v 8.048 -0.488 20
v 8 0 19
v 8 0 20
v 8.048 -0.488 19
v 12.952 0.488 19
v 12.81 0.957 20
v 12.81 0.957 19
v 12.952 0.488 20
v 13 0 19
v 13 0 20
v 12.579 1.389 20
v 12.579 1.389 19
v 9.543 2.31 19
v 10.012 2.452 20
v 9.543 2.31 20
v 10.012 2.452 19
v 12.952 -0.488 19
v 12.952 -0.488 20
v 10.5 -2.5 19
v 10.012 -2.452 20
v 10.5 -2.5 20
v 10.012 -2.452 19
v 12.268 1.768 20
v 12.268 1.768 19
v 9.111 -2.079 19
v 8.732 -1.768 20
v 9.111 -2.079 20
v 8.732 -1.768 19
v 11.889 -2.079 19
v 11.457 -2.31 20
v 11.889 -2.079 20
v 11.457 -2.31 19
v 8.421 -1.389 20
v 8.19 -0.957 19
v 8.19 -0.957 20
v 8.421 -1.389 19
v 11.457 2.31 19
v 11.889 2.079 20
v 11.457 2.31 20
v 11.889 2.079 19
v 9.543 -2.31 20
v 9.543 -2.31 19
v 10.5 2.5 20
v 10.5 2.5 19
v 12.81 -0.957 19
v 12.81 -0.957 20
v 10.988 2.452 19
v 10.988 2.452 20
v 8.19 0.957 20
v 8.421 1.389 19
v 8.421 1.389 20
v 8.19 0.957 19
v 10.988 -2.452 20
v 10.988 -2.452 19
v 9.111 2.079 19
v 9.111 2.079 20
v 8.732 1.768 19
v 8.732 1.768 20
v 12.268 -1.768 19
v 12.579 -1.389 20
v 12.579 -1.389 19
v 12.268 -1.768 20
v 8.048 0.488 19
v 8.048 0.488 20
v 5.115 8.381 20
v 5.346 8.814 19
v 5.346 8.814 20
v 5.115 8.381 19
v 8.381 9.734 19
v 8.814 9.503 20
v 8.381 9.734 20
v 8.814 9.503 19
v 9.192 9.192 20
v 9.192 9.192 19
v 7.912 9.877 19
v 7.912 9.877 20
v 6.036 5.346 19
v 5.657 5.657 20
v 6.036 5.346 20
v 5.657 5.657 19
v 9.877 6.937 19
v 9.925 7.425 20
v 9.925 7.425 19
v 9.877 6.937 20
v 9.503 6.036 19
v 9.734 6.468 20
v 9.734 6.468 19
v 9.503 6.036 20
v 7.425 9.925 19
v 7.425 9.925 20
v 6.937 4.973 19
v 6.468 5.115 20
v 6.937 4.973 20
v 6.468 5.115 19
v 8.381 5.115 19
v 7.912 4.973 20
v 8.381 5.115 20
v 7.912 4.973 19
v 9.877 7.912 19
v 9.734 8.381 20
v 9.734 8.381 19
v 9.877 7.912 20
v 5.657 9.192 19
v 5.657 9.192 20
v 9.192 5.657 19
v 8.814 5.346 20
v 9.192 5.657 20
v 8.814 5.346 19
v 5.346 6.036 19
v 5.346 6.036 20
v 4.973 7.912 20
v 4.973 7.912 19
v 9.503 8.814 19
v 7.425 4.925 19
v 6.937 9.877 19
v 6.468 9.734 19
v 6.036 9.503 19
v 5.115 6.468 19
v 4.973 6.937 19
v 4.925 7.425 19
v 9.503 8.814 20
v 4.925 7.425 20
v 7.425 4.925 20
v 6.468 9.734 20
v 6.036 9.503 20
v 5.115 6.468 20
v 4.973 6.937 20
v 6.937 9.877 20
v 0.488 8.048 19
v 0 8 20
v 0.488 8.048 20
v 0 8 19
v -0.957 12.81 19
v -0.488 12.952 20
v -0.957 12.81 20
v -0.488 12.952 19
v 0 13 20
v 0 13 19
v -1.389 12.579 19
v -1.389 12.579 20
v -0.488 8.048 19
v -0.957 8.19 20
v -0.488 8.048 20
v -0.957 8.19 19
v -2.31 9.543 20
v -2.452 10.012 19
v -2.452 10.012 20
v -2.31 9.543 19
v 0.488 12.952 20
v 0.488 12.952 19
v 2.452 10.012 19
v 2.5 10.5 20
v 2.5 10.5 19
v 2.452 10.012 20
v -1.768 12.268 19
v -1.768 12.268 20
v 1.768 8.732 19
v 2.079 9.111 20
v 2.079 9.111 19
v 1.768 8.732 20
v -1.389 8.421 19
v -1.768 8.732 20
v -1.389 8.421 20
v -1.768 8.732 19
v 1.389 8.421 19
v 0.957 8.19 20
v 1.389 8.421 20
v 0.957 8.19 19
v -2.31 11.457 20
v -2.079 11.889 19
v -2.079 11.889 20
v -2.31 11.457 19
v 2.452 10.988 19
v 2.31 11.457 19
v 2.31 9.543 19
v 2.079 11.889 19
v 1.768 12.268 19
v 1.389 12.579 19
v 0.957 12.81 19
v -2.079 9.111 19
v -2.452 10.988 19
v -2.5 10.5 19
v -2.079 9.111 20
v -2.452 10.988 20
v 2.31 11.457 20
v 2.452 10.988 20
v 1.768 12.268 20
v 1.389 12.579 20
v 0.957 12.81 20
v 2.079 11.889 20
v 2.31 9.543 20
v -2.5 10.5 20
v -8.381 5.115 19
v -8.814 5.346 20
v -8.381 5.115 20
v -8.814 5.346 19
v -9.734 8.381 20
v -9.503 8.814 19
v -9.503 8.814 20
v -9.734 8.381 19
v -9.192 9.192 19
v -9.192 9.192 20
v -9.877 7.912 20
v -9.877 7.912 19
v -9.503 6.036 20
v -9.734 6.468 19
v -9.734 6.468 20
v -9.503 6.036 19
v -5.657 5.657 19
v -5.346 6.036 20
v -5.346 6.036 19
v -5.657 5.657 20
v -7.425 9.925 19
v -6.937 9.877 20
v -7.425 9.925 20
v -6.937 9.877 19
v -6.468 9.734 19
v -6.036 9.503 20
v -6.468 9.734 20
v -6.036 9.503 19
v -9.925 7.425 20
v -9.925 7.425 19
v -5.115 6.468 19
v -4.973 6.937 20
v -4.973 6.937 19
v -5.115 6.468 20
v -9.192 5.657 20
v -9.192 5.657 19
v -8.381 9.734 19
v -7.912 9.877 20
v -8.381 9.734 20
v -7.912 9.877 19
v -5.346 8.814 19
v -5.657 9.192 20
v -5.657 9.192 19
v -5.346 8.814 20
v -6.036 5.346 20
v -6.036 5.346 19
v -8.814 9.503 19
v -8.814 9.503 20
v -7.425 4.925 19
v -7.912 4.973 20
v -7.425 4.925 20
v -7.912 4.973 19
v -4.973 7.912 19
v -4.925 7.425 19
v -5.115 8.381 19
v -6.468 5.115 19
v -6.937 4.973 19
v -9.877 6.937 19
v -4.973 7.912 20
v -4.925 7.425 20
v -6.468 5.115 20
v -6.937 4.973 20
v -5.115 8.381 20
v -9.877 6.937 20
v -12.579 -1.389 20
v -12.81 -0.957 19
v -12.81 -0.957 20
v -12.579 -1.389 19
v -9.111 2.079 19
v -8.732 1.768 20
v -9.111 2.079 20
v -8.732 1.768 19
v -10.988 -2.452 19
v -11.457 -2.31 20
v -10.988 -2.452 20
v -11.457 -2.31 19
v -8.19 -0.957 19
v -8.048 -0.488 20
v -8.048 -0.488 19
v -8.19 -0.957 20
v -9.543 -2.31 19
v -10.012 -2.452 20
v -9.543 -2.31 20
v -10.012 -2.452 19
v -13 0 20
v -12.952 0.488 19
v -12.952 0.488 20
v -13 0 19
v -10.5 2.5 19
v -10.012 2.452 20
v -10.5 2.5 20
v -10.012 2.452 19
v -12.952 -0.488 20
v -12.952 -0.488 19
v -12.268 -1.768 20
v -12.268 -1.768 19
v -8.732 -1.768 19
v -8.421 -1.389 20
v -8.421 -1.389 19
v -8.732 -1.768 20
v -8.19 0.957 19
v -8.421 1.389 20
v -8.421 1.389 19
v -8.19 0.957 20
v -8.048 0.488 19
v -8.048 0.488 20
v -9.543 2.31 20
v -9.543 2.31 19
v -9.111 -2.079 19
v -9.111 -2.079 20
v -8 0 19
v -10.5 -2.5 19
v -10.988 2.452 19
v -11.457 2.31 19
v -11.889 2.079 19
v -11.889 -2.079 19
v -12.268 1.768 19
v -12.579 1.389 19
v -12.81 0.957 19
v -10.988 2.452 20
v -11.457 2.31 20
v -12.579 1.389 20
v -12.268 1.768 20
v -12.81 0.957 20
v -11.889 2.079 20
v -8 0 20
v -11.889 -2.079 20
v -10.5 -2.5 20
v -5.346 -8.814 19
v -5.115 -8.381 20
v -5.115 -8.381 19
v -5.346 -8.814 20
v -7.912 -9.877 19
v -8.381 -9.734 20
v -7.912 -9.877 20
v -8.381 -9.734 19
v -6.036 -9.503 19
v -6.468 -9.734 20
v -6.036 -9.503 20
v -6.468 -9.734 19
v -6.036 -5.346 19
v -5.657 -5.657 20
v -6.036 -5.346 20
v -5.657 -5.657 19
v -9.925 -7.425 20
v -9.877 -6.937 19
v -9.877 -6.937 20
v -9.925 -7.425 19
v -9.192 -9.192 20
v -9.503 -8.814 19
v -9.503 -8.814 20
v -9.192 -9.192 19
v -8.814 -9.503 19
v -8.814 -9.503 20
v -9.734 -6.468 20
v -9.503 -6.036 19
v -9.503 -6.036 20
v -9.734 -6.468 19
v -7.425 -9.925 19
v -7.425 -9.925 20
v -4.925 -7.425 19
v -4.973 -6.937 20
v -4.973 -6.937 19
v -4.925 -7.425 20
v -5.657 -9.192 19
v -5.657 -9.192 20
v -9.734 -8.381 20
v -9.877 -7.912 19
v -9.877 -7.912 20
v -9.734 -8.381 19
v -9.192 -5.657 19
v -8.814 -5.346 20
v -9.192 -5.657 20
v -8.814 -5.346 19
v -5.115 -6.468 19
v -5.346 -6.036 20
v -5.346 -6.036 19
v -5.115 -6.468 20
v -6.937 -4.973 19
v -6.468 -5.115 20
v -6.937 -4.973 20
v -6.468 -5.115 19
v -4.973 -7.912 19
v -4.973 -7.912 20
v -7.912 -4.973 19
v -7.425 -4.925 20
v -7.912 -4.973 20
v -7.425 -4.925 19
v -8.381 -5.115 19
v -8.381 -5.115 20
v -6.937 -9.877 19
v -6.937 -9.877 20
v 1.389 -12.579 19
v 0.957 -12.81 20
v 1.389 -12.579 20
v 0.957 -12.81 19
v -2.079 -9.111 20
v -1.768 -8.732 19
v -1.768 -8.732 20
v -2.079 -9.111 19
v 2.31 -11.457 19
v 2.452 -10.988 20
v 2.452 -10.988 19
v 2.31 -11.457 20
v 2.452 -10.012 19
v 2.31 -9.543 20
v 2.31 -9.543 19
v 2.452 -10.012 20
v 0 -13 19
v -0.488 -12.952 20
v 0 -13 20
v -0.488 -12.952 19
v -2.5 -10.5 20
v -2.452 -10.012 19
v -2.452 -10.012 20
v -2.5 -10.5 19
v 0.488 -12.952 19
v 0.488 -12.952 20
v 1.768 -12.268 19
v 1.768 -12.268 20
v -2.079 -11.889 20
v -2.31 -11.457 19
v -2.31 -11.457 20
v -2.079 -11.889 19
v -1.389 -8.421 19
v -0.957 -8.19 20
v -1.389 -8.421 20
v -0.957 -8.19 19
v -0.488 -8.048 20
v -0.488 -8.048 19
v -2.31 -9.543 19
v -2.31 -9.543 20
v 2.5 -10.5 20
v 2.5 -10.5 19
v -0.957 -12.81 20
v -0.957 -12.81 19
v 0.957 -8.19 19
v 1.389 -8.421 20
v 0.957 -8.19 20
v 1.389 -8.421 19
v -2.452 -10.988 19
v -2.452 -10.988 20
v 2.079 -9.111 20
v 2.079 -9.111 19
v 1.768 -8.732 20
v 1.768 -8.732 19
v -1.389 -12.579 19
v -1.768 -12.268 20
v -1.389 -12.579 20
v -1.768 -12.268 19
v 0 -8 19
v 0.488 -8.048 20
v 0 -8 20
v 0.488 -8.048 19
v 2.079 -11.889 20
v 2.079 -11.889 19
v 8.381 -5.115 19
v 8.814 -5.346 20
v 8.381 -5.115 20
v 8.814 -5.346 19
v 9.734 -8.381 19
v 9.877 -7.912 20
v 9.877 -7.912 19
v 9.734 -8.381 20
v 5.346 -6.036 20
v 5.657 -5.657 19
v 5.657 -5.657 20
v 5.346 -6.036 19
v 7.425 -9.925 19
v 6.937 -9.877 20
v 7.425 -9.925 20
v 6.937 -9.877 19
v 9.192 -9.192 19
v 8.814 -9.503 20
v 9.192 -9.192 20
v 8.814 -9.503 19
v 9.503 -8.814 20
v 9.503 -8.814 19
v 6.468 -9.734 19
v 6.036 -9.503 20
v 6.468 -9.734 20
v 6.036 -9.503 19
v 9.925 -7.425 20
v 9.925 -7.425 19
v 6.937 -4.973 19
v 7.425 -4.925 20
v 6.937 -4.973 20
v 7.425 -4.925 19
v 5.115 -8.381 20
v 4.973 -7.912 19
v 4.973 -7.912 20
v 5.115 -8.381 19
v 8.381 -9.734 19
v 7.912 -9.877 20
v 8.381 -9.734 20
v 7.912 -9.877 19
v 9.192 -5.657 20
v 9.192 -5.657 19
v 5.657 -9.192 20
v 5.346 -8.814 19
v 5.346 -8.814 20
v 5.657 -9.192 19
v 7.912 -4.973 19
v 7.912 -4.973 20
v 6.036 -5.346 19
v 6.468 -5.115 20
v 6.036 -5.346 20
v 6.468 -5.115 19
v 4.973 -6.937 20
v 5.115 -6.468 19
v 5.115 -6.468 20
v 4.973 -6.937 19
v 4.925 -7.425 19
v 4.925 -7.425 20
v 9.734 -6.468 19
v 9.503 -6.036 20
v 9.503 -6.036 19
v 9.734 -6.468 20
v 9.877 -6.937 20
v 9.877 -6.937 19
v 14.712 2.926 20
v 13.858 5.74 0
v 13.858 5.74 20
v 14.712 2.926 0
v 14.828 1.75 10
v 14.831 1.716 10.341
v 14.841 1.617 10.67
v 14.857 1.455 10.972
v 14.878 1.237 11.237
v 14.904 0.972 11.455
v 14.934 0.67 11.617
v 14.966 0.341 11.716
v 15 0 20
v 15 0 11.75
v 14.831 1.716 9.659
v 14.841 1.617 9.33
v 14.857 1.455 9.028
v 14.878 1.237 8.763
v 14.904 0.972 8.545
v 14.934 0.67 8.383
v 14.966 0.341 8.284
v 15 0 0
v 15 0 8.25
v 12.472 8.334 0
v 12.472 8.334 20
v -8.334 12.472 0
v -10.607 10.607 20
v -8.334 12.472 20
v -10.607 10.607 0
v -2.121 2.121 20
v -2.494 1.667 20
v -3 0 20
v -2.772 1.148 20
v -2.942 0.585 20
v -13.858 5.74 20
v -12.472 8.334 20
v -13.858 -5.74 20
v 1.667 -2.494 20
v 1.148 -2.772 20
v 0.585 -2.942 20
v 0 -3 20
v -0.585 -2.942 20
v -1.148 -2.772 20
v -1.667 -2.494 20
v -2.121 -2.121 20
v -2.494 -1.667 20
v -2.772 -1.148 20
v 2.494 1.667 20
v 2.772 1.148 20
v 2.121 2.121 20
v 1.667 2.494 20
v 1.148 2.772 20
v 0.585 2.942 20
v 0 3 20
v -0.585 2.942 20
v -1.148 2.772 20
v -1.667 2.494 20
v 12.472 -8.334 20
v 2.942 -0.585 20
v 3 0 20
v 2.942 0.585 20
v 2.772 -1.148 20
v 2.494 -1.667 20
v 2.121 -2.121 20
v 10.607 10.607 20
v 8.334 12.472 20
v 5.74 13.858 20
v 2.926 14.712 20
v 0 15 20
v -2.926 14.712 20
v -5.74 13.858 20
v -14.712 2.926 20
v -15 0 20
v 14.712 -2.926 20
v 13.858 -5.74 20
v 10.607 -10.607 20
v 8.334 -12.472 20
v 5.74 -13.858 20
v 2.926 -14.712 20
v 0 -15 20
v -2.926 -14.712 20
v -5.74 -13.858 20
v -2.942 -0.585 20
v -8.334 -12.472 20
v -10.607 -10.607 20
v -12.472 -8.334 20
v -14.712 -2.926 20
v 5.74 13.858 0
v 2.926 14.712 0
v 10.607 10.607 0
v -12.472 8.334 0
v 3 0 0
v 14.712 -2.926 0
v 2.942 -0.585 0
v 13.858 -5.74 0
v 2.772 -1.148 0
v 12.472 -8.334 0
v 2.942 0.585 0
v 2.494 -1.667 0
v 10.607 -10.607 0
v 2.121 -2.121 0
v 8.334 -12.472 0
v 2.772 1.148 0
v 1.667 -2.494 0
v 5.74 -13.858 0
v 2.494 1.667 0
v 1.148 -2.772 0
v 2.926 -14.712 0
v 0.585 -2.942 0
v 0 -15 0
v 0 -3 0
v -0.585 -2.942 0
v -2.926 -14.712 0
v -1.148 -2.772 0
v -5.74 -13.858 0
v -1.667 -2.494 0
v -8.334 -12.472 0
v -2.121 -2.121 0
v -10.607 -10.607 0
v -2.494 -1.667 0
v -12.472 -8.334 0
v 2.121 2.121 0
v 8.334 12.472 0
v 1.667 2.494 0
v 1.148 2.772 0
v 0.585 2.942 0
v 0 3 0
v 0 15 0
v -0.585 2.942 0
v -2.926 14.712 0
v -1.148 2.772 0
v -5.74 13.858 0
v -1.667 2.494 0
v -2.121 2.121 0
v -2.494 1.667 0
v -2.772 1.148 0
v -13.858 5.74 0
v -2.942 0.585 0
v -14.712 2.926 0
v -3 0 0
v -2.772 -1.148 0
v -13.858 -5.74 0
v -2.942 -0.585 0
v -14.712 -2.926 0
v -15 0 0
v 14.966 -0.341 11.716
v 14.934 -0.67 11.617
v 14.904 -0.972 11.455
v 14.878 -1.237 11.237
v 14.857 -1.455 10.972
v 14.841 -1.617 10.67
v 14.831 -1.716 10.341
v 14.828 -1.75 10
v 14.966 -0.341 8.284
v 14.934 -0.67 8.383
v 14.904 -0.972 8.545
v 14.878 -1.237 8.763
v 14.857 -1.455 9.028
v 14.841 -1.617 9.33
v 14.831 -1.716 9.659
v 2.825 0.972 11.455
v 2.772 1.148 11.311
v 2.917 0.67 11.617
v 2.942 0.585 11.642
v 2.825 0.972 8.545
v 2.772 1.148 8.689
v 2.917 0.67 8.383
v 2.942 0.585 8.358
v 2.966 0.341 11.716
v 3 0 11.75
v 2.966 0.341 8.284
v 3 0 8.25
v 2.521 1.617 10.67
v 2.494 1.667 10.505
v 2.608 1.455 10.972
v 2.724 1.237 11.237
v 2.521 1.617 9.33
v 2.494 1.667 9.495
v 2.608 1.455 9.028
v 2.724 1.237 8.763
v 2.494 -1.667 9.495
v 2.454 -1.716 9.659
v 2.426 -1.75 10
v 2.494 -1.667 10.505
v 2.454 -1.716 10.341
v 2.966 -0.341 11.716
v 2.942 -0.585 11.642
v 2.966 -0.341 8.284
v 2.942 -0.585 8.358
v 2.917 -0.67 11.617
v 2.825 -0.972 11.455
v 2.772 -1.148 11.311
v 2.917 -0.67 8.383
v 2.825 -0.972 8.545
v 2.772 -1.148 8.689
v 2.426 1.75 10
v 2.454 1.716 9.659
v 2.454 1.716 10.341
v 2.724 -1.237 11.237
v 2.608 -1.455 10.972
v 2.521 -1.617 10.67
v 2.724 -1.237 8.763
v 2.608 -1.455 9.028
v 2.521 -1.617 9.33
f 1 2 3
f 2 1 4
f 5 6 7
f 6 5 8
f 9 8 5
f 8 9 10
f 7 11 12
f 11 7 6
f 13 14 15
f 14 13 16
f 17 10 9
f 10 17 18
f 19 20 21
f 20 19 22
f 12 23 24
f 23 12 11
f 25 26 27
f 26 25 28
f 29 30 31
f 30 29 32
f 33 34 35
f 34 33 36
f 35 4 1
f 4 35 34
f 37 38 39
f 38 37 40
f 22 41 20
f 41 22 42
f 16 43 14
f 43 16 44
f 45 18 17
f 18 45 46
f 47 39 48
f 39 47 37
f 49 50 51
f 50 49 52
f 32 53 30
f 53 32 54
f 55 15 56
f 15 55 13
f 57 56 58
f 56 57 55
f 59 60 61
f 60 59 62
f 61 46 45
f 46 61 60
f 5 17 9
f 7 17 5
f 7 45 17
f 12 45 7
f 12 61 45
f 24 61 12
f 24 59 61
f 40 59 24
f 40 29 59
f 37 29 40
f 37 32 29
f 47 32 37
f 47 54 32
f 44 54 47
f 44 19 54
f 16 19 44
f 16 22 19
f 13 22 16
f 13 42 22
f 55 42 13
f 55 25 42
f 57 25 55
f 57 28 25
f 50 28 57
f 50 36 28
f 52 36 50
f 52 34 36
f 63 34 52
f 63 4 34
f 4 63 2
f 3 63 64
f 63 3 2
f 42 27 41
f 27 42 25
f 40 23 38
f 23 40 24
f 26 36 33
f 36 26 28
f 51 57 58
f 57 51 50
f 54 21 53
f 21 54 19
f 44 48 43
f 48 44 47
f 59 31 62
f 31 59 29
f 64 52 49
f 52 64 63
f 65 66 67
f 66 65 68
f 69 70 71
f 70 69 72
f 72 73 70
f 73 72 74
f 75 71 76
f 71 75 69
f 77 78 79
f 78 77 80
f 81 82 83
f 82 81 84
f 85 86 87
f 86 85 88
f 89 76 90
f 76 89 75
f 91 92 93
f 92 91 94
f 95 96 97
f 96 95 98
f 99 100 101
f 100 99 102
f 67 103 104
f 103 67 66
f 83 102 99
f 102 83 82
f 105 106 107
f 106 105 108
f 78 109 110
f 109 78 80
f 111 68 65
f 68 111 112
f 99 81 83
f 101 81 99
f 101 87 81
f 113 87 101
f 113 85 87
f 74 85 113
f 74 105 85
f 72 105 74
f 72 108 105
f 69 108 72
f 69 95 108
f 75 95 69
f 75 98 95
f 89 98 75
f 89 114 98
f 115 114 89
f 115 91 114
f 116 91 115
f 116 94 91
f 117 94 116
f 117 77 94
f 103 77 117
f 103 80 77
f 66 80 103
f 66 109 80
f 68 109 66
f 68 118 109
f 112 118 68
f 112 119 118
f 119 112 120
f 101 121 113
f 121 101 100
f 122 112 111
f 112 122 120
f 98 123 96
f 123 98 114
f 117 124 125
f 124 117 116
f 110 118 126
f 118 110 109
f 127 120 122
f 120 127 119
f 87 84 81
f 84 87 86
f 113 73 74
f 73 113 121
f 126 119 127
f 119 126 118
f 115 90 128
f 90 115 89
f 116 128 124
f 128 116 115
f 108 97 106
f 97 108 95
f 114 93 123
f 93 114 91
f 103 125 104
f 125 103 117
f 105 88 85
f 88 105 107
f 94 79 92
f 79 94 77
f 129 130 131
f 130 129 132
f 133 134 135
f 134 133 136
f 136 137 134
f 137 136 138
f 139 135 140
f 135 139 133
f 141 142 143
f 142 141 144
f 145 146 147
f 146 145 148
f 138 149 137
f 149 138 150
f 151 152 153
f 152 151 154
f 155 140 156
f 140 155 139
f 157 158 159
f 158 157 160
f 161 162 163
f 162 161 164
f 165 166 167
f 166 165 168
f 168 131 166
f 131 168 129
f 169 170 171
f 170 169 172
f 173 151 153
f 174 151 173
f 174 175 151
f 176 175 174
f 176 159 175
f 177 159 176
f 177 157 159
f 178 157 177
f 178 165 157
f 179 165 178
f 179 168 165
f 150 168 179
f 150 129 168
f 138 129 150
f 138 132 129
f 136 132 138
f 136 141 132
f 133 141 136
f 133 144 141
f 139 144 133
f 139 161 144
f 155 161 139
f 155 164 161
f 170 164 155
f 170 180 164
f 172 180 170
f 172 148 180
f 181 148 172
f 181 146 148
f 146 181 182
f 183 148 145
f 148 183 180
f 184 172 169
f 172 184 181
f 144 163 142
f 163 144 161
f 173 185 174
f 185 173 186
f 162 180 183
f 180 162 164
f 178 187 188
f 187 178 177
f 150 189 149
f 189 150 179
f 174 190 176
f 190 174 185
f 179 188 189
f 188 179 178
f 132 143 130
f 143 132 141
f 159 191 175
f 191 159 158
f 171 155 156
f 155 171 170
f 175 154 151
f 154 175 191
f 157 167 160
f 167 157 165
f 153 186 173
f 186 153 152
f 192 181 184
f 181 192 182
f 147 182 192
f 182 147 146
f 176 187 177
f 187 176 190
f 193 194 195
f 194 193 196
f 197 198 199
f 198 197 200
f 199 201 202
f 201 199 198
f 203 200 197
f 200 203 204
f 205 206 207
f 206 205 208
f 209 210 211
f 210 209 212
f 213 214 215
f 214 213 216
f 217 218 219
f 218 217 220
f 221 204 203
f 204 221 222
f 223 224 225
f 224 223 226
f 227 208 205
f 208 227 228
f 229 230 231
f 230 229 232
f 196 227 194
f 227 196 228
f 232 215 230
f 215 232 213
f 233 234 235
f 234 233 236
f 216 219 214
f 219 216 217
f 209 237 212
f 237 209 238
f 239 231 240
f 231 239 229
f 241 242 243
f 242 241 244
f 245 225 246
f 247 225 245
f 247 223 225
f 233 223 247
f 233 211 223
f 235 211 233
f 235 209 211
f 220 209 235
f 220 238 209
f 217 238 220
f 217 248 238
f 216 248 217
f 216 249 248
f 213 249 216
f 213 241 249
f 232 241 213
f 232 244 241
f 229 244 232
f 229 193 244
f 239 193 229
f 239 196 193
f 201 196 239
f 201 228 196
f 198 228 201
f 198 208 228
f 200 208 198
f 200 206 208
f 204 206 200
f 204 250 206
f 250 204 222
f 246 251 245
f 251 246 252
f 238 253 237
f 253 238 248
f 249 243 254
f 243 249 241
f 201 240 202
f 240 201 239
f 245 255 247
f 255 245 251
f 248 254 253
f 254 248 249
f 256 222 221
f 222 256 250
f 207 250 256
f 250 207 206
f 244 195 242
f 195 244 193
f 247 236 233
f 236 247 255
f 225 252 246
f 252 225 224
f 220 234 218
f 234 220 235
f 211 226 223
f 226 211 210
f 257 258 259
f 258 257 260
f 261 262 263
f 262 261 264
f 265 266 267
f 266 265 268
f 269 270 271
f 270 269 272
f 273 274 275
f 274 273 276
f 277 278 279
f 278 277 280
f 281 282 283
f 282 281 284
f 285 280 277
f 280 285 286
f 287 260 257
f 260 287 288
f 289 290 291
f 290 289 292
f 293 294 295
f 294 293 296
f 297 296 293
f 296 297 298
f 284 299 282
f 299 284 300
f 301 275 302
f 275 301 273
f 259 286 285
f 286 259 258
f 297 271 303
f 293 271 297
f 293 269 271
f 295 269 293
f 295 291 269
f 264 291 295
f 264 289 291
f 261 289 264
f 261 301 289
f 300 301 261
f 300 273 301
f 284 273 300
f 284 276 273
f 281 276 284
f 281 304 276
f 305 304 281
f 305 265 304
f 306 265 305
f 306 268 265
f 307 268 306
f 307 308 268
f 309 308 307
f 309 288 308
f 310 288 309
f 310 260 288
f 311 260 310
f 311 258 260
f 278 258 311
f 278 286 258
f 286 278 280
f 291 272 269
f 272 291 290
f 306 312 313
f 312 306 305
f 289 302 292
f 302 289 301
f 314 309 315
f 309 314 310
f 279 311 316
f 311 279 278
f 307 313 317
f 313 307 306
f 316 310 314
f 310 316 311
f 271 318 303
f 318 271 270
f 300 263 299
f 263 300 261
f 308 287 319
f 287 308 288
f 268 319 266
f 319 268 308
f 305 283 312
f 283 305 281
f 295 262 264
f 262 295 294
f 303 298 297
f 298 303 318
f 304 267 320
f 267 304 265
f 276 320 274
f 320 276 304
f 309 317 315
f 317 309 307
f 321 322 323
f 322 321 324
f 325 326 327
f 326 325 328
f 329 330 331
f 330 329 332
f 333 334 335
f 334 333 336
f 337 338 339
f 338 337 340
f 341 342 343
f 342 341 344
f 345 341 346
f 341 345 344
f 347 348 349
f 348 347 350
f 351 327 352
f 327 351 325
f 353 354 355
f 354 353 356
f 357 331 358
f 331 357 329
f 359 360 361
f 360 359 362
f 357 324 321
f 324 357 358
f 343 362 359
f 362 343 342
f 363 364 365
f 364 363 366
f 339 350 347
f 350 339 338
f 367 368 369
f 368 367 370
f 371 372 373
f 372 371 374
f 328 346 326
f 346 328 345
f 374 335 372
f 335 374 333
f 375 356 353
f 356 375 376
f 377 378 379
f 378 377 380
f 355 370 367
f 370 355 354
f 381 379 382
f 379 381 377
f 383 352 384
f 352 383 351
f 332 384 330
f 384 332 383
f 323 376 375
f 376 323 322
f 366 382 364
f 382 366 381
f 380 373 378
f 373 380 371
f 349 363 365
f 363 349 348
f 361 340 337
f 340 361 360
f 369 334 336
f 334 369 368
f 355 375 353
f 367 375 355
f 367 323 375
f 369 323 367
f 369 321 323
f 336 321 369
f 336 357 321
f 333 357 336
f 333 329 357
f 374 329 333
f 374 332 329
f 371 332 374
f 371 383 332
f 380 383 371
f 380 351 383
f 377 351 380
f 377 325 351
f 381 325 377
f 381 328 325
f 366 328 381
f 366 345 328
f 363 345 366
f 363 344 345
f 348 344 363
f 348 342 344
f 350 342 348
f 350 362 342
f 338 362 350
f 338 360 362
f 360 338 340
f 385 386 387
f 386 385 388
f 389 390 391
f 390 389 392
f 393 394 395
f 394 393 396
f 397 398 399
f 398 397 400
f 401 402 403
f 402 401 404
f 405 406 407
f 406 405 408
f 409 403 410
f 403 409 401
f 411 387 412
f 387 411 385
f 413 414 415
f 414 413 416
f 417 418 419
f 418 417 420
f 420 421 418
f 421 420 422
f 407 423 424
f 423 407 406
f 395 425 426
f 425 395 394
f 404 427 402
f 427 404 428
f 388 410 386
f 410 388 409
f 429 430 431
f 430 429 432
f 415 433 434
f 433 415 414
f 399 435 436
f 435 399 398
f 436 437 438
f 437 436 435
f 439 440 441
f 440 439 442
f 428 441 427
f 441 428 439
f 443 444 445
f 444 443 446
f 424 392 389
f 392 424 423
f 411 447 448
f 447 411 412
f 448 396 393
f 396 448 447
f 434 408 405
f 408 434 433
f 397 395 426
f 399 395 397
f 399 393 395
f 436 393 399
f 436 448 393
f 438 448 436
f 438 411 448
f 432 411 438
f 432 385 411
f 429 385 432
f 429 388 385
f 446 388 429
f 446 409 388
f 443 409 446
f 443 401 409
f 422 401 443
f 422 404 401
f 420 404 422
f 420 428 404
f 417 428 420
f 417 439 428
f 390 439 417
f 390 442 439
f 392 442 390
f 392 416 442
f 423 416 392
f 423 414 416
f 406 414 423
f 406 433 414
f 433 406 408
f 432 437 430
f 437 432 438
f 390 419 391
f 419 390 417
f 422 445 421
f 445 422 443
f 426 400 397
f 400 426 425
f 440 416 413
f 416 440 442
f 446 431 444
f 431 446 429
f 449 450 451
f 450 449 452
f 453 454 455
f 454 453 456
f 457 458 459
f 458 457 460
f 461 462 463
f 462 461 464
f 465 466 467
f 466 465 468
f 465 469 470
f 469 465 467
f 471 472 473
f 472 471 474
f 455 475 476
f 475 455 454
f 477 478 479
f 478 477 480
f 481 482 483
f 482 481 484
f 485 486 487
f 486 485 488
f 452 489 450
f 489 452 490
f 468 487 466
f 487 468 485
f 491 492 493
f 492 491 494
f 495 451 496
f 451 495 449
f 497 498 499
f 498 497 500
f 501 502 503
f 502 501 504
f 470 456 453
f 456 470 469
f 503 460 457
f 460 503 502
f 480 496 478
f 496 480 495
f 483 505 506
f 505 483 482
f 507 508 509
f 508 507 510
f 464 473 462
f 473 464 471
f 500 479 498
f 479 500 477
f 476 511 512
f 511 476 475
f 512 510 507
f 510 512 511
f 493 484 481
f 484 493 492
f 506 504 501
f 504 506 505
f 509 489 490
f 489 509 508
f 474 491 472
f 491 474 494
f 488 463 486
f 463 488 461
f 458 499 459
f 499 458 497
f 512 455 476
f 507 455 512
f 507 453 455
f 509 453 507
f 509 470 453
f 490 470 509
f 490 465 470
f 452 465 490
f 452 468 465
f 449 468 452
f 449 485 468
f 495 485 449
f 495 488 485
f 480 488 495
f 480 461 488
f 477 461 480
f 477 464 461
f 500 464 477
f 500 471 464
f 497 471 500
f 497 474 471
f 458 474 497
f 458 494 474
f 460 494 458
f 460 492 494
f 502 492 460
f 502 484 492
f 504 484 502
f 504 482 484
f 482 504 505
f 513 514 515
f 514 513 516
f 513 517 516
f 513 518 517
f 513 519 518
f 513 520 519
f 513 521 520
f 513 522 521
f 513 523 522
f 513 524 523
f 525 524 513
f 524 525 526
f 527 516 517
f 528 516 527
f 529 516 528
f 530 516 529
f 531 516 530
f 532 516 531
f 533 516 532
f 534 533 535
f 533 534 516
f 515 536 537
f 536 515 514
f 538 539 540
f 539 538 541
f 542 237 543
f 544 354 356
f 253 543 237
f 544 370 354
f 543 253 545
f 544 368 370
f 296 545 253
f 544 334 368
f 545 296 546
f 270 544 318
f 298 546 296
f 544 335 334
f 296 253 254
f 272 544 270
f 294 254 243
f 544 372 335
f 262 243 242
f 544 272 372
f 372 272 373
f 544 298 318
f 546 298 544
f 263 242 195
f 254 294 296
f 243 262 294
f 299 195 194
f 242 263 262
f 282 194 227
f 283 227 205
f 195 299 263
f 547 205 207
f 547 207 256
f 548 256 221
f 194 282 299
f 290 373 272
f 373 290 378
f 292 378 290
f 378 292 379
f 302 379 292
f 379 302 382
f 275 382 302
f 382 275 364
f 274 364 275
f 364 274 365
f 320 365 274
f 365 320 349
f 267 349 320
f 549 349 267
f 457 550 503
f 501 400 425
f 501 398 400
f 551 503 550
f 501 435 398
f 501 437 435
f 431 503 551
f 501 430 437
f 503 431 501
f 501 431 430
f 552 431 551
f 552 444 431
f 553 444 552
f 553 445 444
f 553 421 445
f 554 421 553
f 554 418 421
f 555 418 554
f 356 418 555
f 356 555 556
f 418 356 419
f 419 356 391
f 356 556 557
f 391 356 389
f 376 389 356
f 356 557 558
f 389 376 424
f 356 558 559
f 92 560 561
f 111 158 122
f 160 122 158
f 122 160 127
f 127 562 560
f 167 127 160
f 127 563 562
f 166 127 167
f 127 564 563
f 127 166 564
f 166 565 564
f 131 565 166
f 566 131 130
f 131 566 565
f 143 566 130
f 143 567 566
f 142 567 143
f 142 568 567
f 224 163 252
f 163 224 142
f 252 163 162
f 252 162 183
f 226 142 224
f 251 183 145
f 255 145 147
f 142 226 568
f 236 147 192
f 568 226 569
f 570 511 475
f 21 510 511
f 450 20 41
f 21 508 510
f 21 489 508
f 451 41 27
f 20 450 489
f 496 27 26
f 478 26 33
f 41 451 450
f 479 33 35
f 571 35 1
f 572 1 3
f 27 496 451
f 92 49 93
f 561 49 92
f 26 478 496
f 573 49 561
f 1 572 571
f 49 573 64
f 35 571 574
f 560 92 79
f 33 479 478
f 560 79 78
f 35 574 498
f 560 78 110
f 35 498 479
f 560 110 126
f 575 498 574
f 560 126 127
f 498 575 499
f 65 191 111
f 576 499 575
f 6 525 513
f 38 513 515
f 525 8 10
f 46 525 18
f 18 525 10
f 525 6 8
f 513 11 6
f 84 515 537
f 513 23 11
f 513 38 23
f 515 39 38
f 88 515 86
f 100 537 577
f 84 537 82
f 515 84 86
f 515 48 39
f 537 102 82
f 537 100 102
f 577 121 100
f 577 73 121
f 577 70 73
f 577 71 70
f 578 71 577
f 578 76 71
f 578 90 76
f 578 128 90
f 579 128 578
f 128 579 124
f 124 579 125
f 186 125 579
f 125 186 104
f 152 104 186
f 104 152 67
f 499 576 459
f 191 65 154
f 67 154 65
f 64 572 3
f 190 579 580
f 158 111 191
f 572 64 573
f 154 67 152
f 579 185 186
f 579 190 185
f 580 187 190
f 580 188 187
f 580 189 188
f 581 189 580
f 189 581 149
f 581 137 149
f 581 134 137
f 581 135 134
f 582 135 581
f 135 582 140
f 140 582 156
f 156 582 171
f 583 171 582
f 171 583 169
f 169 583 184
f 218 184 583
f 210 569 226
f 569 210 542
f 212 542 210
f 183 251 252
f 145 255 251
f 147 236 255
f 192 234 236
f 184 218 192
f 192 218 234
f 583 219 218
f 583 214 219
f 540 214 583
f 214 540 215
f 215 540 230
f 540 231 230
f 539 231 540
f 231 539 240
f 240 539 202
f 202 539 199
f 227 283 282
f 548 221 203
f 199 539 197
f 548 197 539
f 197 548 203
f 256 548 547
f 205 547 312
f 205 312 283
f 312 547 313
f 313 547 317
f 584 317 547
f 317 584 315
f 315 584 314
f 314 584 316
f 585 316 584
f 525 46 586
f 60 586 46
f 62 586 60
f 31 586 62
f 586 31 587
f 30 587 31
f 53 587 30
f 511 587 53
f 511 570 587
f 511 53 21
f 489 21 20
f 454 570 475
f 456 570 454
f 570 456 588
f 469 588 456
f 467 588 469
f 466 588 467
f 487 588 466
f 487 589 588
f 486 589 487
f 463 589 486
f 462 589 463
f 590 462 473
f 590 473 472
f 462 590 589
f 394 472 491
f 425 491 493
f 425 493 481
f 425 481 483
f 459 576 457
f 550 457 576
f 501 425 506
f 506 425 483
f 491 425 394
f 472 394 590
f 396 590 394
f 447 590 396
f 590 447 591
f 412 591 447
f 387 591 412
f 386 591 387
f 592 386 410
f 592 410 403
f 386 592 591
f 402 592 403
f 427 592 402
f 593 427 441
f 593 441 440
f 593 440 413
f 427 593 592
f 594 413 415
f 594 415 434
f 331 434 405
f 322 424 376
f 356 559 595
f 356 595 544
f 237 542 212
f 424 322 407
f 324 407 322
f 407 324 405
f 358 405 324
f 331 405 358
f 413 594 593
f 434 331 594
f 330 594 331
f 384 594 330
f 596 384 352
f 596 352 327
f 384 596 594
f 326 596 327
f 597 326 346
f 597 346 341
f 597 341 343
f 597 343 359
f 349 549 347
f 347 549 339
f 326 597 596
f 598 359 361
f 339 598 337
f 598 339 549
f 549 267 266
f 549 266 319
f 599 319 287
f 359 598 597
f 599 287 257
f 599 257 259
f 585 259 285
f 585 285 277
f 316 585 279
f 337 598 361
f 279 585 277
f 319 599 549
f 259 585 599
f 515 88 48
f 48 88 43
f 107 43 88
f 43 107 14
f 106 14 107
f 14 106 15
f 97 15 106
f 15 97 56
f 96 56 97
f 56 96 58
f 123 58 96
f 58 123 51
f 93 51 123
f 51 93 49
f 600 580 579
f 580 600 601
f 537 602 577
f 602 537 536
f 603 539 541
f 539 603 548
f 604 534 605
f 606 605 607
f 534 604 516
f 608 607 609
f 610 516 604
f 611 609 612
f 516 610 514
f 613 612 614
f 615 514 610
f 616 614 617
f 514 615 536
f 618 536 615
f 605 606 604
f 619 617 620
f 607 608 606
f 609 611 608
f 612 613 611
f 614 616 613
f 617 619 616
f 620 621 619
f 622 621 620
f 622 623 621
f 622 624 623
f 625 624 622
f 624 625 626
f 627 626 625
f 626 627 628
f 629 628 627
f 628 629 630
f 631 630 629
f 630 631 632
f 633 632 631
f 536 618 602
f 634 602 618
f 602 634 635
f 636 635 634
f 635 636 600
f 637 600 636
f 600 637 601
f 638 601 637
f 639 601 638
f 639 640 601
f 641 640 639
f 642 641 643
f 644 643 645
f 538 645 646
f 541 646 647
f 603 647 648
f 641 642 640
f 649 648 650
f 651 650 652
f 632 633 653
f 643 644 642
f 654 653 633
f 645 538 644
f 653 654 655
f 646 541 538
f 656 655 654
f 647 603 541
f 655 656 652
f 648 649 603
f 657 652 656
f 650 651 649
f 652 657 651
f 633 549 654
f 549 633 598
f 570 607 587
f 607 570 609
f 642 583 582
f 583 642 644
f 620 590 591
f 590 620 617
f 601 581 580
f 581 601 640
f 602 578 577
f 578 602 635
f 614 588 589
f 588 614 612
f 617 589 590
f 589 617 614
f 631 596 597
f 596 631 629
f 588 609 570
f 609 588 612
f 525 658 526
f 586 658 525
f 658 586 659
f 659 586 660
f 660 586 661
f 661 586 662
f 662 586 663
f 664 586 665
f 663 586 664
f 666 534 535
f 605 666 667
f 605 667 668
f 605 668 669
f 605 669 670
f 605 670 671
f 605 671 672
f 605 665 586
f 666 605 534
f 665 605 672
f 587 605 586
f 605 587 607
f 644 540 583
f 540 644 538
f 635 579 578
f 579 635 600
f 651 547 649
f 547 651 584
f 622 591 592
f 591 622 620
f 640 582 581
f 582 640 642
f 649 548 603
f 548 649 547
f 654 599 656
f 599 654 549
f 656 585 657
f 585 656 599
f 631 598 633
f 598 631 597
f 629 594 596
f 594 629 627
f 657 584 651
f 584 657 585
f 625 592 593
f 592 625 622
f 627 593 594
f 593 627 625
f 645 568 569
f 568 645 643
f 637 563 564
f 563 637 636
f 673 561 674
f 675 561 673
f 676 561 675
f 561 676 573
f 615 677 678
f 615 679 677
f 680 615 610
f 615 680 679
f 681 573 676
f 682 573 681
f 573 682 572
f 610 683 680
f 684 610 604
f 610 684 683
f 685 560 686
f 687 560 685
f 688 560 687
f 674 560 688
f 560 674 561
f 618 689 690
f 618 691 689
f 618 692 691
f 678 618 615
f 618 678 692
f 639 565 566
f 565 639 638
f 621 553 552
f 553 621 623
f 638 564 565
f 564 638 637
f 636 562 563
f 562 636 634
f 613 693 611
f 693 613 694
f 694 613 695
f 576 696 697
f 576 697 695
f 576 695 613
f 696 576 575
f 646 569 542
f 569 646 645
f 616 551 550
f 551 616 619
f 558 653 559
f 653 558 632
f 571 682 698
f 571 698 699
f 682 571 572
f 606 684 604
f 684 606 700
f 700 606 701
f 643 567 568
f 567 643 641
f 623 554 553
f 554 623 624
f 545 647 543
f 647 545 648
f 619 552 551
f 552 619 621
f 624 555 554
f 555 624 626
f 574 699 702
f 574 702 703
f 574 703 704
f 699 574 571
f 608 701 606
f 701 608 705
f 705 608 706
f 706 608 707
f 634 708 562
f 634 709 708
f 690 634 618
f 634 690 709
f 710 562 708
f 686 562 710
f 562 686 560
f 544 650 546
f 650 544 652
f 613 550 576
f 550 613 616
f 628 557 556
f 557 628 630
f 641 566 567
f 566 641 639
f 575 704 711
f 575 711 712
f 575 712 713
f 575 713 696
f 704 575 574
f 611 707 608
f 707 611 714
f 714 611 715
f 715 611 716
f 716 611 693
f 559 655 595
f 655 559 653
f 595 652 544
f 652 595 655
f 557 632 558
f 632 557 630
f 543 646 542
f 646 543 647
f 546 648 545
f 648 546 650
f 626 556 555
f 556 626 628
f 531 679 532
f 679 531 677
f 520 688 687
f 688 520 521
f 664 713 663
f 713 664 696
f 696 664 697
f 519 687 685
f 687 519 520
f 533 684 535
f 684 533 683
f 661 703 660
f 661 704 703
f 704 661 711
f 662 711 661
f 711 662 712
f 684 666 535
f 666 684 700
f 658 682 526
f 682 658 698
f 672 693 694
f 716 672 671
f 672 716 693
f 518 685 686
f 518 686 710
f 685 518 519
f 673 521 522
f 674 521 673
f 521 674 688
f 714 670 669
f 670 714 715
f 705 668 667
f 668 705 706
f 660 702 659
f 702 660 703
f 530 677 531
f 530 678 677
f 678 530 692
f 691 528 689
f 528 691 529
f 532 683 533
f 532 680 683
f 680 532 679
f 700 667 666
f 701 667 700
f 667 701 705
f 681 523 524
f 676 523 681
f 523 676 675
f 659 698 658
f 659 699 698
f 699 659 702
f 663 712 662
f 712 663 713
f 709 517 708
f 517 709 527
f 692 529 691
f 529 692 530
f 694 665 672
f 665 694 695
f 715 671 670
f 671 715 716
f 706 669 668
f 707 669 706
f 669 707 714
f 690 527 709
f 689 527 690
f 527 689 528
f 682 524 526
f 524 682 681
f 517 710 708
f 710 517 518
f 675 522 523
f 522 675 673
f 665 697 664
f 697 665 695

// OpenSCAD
$fn = 32;

// ----------------------------------------------------------------------
// Control knob: dimpled knob
// ----------------------------------------------------------------------

// --- parameters (mm) ---
dimp_d = 5;               // finger dimple diameter
n_dimp = 8;               // number of dimples
dimp_r = 10.5;            // dimple ring radius
knob_d = 30;              // knob body diameter
knob_h = 20;              // knob body height
bore_d = 6;               // shaft bore diameter
set_d = 3.5;              // set screw bore diameter

dimp_step = 360 / n_dimp;  // dimple angular step

difference() {
  cylinder(h = knob_h, d = knob_d);
  translate([0, 0, -1]) cylinder(h = knob_h + 2, d = bore_d);
  translate([-1, 0, knob_h / 2]) rotate([0, 90, 0])
    cylinder(h = knob_d / 2 + bore_d / 2 + 2, d = set_d);  for (i = [0 : n_dimp - 1])
    rotate([0, 0, i * dimp_step])
      translate([dimp_r, 0, knob_h - 1])
        cylinder(h = 2, d = dimp_d);
}
